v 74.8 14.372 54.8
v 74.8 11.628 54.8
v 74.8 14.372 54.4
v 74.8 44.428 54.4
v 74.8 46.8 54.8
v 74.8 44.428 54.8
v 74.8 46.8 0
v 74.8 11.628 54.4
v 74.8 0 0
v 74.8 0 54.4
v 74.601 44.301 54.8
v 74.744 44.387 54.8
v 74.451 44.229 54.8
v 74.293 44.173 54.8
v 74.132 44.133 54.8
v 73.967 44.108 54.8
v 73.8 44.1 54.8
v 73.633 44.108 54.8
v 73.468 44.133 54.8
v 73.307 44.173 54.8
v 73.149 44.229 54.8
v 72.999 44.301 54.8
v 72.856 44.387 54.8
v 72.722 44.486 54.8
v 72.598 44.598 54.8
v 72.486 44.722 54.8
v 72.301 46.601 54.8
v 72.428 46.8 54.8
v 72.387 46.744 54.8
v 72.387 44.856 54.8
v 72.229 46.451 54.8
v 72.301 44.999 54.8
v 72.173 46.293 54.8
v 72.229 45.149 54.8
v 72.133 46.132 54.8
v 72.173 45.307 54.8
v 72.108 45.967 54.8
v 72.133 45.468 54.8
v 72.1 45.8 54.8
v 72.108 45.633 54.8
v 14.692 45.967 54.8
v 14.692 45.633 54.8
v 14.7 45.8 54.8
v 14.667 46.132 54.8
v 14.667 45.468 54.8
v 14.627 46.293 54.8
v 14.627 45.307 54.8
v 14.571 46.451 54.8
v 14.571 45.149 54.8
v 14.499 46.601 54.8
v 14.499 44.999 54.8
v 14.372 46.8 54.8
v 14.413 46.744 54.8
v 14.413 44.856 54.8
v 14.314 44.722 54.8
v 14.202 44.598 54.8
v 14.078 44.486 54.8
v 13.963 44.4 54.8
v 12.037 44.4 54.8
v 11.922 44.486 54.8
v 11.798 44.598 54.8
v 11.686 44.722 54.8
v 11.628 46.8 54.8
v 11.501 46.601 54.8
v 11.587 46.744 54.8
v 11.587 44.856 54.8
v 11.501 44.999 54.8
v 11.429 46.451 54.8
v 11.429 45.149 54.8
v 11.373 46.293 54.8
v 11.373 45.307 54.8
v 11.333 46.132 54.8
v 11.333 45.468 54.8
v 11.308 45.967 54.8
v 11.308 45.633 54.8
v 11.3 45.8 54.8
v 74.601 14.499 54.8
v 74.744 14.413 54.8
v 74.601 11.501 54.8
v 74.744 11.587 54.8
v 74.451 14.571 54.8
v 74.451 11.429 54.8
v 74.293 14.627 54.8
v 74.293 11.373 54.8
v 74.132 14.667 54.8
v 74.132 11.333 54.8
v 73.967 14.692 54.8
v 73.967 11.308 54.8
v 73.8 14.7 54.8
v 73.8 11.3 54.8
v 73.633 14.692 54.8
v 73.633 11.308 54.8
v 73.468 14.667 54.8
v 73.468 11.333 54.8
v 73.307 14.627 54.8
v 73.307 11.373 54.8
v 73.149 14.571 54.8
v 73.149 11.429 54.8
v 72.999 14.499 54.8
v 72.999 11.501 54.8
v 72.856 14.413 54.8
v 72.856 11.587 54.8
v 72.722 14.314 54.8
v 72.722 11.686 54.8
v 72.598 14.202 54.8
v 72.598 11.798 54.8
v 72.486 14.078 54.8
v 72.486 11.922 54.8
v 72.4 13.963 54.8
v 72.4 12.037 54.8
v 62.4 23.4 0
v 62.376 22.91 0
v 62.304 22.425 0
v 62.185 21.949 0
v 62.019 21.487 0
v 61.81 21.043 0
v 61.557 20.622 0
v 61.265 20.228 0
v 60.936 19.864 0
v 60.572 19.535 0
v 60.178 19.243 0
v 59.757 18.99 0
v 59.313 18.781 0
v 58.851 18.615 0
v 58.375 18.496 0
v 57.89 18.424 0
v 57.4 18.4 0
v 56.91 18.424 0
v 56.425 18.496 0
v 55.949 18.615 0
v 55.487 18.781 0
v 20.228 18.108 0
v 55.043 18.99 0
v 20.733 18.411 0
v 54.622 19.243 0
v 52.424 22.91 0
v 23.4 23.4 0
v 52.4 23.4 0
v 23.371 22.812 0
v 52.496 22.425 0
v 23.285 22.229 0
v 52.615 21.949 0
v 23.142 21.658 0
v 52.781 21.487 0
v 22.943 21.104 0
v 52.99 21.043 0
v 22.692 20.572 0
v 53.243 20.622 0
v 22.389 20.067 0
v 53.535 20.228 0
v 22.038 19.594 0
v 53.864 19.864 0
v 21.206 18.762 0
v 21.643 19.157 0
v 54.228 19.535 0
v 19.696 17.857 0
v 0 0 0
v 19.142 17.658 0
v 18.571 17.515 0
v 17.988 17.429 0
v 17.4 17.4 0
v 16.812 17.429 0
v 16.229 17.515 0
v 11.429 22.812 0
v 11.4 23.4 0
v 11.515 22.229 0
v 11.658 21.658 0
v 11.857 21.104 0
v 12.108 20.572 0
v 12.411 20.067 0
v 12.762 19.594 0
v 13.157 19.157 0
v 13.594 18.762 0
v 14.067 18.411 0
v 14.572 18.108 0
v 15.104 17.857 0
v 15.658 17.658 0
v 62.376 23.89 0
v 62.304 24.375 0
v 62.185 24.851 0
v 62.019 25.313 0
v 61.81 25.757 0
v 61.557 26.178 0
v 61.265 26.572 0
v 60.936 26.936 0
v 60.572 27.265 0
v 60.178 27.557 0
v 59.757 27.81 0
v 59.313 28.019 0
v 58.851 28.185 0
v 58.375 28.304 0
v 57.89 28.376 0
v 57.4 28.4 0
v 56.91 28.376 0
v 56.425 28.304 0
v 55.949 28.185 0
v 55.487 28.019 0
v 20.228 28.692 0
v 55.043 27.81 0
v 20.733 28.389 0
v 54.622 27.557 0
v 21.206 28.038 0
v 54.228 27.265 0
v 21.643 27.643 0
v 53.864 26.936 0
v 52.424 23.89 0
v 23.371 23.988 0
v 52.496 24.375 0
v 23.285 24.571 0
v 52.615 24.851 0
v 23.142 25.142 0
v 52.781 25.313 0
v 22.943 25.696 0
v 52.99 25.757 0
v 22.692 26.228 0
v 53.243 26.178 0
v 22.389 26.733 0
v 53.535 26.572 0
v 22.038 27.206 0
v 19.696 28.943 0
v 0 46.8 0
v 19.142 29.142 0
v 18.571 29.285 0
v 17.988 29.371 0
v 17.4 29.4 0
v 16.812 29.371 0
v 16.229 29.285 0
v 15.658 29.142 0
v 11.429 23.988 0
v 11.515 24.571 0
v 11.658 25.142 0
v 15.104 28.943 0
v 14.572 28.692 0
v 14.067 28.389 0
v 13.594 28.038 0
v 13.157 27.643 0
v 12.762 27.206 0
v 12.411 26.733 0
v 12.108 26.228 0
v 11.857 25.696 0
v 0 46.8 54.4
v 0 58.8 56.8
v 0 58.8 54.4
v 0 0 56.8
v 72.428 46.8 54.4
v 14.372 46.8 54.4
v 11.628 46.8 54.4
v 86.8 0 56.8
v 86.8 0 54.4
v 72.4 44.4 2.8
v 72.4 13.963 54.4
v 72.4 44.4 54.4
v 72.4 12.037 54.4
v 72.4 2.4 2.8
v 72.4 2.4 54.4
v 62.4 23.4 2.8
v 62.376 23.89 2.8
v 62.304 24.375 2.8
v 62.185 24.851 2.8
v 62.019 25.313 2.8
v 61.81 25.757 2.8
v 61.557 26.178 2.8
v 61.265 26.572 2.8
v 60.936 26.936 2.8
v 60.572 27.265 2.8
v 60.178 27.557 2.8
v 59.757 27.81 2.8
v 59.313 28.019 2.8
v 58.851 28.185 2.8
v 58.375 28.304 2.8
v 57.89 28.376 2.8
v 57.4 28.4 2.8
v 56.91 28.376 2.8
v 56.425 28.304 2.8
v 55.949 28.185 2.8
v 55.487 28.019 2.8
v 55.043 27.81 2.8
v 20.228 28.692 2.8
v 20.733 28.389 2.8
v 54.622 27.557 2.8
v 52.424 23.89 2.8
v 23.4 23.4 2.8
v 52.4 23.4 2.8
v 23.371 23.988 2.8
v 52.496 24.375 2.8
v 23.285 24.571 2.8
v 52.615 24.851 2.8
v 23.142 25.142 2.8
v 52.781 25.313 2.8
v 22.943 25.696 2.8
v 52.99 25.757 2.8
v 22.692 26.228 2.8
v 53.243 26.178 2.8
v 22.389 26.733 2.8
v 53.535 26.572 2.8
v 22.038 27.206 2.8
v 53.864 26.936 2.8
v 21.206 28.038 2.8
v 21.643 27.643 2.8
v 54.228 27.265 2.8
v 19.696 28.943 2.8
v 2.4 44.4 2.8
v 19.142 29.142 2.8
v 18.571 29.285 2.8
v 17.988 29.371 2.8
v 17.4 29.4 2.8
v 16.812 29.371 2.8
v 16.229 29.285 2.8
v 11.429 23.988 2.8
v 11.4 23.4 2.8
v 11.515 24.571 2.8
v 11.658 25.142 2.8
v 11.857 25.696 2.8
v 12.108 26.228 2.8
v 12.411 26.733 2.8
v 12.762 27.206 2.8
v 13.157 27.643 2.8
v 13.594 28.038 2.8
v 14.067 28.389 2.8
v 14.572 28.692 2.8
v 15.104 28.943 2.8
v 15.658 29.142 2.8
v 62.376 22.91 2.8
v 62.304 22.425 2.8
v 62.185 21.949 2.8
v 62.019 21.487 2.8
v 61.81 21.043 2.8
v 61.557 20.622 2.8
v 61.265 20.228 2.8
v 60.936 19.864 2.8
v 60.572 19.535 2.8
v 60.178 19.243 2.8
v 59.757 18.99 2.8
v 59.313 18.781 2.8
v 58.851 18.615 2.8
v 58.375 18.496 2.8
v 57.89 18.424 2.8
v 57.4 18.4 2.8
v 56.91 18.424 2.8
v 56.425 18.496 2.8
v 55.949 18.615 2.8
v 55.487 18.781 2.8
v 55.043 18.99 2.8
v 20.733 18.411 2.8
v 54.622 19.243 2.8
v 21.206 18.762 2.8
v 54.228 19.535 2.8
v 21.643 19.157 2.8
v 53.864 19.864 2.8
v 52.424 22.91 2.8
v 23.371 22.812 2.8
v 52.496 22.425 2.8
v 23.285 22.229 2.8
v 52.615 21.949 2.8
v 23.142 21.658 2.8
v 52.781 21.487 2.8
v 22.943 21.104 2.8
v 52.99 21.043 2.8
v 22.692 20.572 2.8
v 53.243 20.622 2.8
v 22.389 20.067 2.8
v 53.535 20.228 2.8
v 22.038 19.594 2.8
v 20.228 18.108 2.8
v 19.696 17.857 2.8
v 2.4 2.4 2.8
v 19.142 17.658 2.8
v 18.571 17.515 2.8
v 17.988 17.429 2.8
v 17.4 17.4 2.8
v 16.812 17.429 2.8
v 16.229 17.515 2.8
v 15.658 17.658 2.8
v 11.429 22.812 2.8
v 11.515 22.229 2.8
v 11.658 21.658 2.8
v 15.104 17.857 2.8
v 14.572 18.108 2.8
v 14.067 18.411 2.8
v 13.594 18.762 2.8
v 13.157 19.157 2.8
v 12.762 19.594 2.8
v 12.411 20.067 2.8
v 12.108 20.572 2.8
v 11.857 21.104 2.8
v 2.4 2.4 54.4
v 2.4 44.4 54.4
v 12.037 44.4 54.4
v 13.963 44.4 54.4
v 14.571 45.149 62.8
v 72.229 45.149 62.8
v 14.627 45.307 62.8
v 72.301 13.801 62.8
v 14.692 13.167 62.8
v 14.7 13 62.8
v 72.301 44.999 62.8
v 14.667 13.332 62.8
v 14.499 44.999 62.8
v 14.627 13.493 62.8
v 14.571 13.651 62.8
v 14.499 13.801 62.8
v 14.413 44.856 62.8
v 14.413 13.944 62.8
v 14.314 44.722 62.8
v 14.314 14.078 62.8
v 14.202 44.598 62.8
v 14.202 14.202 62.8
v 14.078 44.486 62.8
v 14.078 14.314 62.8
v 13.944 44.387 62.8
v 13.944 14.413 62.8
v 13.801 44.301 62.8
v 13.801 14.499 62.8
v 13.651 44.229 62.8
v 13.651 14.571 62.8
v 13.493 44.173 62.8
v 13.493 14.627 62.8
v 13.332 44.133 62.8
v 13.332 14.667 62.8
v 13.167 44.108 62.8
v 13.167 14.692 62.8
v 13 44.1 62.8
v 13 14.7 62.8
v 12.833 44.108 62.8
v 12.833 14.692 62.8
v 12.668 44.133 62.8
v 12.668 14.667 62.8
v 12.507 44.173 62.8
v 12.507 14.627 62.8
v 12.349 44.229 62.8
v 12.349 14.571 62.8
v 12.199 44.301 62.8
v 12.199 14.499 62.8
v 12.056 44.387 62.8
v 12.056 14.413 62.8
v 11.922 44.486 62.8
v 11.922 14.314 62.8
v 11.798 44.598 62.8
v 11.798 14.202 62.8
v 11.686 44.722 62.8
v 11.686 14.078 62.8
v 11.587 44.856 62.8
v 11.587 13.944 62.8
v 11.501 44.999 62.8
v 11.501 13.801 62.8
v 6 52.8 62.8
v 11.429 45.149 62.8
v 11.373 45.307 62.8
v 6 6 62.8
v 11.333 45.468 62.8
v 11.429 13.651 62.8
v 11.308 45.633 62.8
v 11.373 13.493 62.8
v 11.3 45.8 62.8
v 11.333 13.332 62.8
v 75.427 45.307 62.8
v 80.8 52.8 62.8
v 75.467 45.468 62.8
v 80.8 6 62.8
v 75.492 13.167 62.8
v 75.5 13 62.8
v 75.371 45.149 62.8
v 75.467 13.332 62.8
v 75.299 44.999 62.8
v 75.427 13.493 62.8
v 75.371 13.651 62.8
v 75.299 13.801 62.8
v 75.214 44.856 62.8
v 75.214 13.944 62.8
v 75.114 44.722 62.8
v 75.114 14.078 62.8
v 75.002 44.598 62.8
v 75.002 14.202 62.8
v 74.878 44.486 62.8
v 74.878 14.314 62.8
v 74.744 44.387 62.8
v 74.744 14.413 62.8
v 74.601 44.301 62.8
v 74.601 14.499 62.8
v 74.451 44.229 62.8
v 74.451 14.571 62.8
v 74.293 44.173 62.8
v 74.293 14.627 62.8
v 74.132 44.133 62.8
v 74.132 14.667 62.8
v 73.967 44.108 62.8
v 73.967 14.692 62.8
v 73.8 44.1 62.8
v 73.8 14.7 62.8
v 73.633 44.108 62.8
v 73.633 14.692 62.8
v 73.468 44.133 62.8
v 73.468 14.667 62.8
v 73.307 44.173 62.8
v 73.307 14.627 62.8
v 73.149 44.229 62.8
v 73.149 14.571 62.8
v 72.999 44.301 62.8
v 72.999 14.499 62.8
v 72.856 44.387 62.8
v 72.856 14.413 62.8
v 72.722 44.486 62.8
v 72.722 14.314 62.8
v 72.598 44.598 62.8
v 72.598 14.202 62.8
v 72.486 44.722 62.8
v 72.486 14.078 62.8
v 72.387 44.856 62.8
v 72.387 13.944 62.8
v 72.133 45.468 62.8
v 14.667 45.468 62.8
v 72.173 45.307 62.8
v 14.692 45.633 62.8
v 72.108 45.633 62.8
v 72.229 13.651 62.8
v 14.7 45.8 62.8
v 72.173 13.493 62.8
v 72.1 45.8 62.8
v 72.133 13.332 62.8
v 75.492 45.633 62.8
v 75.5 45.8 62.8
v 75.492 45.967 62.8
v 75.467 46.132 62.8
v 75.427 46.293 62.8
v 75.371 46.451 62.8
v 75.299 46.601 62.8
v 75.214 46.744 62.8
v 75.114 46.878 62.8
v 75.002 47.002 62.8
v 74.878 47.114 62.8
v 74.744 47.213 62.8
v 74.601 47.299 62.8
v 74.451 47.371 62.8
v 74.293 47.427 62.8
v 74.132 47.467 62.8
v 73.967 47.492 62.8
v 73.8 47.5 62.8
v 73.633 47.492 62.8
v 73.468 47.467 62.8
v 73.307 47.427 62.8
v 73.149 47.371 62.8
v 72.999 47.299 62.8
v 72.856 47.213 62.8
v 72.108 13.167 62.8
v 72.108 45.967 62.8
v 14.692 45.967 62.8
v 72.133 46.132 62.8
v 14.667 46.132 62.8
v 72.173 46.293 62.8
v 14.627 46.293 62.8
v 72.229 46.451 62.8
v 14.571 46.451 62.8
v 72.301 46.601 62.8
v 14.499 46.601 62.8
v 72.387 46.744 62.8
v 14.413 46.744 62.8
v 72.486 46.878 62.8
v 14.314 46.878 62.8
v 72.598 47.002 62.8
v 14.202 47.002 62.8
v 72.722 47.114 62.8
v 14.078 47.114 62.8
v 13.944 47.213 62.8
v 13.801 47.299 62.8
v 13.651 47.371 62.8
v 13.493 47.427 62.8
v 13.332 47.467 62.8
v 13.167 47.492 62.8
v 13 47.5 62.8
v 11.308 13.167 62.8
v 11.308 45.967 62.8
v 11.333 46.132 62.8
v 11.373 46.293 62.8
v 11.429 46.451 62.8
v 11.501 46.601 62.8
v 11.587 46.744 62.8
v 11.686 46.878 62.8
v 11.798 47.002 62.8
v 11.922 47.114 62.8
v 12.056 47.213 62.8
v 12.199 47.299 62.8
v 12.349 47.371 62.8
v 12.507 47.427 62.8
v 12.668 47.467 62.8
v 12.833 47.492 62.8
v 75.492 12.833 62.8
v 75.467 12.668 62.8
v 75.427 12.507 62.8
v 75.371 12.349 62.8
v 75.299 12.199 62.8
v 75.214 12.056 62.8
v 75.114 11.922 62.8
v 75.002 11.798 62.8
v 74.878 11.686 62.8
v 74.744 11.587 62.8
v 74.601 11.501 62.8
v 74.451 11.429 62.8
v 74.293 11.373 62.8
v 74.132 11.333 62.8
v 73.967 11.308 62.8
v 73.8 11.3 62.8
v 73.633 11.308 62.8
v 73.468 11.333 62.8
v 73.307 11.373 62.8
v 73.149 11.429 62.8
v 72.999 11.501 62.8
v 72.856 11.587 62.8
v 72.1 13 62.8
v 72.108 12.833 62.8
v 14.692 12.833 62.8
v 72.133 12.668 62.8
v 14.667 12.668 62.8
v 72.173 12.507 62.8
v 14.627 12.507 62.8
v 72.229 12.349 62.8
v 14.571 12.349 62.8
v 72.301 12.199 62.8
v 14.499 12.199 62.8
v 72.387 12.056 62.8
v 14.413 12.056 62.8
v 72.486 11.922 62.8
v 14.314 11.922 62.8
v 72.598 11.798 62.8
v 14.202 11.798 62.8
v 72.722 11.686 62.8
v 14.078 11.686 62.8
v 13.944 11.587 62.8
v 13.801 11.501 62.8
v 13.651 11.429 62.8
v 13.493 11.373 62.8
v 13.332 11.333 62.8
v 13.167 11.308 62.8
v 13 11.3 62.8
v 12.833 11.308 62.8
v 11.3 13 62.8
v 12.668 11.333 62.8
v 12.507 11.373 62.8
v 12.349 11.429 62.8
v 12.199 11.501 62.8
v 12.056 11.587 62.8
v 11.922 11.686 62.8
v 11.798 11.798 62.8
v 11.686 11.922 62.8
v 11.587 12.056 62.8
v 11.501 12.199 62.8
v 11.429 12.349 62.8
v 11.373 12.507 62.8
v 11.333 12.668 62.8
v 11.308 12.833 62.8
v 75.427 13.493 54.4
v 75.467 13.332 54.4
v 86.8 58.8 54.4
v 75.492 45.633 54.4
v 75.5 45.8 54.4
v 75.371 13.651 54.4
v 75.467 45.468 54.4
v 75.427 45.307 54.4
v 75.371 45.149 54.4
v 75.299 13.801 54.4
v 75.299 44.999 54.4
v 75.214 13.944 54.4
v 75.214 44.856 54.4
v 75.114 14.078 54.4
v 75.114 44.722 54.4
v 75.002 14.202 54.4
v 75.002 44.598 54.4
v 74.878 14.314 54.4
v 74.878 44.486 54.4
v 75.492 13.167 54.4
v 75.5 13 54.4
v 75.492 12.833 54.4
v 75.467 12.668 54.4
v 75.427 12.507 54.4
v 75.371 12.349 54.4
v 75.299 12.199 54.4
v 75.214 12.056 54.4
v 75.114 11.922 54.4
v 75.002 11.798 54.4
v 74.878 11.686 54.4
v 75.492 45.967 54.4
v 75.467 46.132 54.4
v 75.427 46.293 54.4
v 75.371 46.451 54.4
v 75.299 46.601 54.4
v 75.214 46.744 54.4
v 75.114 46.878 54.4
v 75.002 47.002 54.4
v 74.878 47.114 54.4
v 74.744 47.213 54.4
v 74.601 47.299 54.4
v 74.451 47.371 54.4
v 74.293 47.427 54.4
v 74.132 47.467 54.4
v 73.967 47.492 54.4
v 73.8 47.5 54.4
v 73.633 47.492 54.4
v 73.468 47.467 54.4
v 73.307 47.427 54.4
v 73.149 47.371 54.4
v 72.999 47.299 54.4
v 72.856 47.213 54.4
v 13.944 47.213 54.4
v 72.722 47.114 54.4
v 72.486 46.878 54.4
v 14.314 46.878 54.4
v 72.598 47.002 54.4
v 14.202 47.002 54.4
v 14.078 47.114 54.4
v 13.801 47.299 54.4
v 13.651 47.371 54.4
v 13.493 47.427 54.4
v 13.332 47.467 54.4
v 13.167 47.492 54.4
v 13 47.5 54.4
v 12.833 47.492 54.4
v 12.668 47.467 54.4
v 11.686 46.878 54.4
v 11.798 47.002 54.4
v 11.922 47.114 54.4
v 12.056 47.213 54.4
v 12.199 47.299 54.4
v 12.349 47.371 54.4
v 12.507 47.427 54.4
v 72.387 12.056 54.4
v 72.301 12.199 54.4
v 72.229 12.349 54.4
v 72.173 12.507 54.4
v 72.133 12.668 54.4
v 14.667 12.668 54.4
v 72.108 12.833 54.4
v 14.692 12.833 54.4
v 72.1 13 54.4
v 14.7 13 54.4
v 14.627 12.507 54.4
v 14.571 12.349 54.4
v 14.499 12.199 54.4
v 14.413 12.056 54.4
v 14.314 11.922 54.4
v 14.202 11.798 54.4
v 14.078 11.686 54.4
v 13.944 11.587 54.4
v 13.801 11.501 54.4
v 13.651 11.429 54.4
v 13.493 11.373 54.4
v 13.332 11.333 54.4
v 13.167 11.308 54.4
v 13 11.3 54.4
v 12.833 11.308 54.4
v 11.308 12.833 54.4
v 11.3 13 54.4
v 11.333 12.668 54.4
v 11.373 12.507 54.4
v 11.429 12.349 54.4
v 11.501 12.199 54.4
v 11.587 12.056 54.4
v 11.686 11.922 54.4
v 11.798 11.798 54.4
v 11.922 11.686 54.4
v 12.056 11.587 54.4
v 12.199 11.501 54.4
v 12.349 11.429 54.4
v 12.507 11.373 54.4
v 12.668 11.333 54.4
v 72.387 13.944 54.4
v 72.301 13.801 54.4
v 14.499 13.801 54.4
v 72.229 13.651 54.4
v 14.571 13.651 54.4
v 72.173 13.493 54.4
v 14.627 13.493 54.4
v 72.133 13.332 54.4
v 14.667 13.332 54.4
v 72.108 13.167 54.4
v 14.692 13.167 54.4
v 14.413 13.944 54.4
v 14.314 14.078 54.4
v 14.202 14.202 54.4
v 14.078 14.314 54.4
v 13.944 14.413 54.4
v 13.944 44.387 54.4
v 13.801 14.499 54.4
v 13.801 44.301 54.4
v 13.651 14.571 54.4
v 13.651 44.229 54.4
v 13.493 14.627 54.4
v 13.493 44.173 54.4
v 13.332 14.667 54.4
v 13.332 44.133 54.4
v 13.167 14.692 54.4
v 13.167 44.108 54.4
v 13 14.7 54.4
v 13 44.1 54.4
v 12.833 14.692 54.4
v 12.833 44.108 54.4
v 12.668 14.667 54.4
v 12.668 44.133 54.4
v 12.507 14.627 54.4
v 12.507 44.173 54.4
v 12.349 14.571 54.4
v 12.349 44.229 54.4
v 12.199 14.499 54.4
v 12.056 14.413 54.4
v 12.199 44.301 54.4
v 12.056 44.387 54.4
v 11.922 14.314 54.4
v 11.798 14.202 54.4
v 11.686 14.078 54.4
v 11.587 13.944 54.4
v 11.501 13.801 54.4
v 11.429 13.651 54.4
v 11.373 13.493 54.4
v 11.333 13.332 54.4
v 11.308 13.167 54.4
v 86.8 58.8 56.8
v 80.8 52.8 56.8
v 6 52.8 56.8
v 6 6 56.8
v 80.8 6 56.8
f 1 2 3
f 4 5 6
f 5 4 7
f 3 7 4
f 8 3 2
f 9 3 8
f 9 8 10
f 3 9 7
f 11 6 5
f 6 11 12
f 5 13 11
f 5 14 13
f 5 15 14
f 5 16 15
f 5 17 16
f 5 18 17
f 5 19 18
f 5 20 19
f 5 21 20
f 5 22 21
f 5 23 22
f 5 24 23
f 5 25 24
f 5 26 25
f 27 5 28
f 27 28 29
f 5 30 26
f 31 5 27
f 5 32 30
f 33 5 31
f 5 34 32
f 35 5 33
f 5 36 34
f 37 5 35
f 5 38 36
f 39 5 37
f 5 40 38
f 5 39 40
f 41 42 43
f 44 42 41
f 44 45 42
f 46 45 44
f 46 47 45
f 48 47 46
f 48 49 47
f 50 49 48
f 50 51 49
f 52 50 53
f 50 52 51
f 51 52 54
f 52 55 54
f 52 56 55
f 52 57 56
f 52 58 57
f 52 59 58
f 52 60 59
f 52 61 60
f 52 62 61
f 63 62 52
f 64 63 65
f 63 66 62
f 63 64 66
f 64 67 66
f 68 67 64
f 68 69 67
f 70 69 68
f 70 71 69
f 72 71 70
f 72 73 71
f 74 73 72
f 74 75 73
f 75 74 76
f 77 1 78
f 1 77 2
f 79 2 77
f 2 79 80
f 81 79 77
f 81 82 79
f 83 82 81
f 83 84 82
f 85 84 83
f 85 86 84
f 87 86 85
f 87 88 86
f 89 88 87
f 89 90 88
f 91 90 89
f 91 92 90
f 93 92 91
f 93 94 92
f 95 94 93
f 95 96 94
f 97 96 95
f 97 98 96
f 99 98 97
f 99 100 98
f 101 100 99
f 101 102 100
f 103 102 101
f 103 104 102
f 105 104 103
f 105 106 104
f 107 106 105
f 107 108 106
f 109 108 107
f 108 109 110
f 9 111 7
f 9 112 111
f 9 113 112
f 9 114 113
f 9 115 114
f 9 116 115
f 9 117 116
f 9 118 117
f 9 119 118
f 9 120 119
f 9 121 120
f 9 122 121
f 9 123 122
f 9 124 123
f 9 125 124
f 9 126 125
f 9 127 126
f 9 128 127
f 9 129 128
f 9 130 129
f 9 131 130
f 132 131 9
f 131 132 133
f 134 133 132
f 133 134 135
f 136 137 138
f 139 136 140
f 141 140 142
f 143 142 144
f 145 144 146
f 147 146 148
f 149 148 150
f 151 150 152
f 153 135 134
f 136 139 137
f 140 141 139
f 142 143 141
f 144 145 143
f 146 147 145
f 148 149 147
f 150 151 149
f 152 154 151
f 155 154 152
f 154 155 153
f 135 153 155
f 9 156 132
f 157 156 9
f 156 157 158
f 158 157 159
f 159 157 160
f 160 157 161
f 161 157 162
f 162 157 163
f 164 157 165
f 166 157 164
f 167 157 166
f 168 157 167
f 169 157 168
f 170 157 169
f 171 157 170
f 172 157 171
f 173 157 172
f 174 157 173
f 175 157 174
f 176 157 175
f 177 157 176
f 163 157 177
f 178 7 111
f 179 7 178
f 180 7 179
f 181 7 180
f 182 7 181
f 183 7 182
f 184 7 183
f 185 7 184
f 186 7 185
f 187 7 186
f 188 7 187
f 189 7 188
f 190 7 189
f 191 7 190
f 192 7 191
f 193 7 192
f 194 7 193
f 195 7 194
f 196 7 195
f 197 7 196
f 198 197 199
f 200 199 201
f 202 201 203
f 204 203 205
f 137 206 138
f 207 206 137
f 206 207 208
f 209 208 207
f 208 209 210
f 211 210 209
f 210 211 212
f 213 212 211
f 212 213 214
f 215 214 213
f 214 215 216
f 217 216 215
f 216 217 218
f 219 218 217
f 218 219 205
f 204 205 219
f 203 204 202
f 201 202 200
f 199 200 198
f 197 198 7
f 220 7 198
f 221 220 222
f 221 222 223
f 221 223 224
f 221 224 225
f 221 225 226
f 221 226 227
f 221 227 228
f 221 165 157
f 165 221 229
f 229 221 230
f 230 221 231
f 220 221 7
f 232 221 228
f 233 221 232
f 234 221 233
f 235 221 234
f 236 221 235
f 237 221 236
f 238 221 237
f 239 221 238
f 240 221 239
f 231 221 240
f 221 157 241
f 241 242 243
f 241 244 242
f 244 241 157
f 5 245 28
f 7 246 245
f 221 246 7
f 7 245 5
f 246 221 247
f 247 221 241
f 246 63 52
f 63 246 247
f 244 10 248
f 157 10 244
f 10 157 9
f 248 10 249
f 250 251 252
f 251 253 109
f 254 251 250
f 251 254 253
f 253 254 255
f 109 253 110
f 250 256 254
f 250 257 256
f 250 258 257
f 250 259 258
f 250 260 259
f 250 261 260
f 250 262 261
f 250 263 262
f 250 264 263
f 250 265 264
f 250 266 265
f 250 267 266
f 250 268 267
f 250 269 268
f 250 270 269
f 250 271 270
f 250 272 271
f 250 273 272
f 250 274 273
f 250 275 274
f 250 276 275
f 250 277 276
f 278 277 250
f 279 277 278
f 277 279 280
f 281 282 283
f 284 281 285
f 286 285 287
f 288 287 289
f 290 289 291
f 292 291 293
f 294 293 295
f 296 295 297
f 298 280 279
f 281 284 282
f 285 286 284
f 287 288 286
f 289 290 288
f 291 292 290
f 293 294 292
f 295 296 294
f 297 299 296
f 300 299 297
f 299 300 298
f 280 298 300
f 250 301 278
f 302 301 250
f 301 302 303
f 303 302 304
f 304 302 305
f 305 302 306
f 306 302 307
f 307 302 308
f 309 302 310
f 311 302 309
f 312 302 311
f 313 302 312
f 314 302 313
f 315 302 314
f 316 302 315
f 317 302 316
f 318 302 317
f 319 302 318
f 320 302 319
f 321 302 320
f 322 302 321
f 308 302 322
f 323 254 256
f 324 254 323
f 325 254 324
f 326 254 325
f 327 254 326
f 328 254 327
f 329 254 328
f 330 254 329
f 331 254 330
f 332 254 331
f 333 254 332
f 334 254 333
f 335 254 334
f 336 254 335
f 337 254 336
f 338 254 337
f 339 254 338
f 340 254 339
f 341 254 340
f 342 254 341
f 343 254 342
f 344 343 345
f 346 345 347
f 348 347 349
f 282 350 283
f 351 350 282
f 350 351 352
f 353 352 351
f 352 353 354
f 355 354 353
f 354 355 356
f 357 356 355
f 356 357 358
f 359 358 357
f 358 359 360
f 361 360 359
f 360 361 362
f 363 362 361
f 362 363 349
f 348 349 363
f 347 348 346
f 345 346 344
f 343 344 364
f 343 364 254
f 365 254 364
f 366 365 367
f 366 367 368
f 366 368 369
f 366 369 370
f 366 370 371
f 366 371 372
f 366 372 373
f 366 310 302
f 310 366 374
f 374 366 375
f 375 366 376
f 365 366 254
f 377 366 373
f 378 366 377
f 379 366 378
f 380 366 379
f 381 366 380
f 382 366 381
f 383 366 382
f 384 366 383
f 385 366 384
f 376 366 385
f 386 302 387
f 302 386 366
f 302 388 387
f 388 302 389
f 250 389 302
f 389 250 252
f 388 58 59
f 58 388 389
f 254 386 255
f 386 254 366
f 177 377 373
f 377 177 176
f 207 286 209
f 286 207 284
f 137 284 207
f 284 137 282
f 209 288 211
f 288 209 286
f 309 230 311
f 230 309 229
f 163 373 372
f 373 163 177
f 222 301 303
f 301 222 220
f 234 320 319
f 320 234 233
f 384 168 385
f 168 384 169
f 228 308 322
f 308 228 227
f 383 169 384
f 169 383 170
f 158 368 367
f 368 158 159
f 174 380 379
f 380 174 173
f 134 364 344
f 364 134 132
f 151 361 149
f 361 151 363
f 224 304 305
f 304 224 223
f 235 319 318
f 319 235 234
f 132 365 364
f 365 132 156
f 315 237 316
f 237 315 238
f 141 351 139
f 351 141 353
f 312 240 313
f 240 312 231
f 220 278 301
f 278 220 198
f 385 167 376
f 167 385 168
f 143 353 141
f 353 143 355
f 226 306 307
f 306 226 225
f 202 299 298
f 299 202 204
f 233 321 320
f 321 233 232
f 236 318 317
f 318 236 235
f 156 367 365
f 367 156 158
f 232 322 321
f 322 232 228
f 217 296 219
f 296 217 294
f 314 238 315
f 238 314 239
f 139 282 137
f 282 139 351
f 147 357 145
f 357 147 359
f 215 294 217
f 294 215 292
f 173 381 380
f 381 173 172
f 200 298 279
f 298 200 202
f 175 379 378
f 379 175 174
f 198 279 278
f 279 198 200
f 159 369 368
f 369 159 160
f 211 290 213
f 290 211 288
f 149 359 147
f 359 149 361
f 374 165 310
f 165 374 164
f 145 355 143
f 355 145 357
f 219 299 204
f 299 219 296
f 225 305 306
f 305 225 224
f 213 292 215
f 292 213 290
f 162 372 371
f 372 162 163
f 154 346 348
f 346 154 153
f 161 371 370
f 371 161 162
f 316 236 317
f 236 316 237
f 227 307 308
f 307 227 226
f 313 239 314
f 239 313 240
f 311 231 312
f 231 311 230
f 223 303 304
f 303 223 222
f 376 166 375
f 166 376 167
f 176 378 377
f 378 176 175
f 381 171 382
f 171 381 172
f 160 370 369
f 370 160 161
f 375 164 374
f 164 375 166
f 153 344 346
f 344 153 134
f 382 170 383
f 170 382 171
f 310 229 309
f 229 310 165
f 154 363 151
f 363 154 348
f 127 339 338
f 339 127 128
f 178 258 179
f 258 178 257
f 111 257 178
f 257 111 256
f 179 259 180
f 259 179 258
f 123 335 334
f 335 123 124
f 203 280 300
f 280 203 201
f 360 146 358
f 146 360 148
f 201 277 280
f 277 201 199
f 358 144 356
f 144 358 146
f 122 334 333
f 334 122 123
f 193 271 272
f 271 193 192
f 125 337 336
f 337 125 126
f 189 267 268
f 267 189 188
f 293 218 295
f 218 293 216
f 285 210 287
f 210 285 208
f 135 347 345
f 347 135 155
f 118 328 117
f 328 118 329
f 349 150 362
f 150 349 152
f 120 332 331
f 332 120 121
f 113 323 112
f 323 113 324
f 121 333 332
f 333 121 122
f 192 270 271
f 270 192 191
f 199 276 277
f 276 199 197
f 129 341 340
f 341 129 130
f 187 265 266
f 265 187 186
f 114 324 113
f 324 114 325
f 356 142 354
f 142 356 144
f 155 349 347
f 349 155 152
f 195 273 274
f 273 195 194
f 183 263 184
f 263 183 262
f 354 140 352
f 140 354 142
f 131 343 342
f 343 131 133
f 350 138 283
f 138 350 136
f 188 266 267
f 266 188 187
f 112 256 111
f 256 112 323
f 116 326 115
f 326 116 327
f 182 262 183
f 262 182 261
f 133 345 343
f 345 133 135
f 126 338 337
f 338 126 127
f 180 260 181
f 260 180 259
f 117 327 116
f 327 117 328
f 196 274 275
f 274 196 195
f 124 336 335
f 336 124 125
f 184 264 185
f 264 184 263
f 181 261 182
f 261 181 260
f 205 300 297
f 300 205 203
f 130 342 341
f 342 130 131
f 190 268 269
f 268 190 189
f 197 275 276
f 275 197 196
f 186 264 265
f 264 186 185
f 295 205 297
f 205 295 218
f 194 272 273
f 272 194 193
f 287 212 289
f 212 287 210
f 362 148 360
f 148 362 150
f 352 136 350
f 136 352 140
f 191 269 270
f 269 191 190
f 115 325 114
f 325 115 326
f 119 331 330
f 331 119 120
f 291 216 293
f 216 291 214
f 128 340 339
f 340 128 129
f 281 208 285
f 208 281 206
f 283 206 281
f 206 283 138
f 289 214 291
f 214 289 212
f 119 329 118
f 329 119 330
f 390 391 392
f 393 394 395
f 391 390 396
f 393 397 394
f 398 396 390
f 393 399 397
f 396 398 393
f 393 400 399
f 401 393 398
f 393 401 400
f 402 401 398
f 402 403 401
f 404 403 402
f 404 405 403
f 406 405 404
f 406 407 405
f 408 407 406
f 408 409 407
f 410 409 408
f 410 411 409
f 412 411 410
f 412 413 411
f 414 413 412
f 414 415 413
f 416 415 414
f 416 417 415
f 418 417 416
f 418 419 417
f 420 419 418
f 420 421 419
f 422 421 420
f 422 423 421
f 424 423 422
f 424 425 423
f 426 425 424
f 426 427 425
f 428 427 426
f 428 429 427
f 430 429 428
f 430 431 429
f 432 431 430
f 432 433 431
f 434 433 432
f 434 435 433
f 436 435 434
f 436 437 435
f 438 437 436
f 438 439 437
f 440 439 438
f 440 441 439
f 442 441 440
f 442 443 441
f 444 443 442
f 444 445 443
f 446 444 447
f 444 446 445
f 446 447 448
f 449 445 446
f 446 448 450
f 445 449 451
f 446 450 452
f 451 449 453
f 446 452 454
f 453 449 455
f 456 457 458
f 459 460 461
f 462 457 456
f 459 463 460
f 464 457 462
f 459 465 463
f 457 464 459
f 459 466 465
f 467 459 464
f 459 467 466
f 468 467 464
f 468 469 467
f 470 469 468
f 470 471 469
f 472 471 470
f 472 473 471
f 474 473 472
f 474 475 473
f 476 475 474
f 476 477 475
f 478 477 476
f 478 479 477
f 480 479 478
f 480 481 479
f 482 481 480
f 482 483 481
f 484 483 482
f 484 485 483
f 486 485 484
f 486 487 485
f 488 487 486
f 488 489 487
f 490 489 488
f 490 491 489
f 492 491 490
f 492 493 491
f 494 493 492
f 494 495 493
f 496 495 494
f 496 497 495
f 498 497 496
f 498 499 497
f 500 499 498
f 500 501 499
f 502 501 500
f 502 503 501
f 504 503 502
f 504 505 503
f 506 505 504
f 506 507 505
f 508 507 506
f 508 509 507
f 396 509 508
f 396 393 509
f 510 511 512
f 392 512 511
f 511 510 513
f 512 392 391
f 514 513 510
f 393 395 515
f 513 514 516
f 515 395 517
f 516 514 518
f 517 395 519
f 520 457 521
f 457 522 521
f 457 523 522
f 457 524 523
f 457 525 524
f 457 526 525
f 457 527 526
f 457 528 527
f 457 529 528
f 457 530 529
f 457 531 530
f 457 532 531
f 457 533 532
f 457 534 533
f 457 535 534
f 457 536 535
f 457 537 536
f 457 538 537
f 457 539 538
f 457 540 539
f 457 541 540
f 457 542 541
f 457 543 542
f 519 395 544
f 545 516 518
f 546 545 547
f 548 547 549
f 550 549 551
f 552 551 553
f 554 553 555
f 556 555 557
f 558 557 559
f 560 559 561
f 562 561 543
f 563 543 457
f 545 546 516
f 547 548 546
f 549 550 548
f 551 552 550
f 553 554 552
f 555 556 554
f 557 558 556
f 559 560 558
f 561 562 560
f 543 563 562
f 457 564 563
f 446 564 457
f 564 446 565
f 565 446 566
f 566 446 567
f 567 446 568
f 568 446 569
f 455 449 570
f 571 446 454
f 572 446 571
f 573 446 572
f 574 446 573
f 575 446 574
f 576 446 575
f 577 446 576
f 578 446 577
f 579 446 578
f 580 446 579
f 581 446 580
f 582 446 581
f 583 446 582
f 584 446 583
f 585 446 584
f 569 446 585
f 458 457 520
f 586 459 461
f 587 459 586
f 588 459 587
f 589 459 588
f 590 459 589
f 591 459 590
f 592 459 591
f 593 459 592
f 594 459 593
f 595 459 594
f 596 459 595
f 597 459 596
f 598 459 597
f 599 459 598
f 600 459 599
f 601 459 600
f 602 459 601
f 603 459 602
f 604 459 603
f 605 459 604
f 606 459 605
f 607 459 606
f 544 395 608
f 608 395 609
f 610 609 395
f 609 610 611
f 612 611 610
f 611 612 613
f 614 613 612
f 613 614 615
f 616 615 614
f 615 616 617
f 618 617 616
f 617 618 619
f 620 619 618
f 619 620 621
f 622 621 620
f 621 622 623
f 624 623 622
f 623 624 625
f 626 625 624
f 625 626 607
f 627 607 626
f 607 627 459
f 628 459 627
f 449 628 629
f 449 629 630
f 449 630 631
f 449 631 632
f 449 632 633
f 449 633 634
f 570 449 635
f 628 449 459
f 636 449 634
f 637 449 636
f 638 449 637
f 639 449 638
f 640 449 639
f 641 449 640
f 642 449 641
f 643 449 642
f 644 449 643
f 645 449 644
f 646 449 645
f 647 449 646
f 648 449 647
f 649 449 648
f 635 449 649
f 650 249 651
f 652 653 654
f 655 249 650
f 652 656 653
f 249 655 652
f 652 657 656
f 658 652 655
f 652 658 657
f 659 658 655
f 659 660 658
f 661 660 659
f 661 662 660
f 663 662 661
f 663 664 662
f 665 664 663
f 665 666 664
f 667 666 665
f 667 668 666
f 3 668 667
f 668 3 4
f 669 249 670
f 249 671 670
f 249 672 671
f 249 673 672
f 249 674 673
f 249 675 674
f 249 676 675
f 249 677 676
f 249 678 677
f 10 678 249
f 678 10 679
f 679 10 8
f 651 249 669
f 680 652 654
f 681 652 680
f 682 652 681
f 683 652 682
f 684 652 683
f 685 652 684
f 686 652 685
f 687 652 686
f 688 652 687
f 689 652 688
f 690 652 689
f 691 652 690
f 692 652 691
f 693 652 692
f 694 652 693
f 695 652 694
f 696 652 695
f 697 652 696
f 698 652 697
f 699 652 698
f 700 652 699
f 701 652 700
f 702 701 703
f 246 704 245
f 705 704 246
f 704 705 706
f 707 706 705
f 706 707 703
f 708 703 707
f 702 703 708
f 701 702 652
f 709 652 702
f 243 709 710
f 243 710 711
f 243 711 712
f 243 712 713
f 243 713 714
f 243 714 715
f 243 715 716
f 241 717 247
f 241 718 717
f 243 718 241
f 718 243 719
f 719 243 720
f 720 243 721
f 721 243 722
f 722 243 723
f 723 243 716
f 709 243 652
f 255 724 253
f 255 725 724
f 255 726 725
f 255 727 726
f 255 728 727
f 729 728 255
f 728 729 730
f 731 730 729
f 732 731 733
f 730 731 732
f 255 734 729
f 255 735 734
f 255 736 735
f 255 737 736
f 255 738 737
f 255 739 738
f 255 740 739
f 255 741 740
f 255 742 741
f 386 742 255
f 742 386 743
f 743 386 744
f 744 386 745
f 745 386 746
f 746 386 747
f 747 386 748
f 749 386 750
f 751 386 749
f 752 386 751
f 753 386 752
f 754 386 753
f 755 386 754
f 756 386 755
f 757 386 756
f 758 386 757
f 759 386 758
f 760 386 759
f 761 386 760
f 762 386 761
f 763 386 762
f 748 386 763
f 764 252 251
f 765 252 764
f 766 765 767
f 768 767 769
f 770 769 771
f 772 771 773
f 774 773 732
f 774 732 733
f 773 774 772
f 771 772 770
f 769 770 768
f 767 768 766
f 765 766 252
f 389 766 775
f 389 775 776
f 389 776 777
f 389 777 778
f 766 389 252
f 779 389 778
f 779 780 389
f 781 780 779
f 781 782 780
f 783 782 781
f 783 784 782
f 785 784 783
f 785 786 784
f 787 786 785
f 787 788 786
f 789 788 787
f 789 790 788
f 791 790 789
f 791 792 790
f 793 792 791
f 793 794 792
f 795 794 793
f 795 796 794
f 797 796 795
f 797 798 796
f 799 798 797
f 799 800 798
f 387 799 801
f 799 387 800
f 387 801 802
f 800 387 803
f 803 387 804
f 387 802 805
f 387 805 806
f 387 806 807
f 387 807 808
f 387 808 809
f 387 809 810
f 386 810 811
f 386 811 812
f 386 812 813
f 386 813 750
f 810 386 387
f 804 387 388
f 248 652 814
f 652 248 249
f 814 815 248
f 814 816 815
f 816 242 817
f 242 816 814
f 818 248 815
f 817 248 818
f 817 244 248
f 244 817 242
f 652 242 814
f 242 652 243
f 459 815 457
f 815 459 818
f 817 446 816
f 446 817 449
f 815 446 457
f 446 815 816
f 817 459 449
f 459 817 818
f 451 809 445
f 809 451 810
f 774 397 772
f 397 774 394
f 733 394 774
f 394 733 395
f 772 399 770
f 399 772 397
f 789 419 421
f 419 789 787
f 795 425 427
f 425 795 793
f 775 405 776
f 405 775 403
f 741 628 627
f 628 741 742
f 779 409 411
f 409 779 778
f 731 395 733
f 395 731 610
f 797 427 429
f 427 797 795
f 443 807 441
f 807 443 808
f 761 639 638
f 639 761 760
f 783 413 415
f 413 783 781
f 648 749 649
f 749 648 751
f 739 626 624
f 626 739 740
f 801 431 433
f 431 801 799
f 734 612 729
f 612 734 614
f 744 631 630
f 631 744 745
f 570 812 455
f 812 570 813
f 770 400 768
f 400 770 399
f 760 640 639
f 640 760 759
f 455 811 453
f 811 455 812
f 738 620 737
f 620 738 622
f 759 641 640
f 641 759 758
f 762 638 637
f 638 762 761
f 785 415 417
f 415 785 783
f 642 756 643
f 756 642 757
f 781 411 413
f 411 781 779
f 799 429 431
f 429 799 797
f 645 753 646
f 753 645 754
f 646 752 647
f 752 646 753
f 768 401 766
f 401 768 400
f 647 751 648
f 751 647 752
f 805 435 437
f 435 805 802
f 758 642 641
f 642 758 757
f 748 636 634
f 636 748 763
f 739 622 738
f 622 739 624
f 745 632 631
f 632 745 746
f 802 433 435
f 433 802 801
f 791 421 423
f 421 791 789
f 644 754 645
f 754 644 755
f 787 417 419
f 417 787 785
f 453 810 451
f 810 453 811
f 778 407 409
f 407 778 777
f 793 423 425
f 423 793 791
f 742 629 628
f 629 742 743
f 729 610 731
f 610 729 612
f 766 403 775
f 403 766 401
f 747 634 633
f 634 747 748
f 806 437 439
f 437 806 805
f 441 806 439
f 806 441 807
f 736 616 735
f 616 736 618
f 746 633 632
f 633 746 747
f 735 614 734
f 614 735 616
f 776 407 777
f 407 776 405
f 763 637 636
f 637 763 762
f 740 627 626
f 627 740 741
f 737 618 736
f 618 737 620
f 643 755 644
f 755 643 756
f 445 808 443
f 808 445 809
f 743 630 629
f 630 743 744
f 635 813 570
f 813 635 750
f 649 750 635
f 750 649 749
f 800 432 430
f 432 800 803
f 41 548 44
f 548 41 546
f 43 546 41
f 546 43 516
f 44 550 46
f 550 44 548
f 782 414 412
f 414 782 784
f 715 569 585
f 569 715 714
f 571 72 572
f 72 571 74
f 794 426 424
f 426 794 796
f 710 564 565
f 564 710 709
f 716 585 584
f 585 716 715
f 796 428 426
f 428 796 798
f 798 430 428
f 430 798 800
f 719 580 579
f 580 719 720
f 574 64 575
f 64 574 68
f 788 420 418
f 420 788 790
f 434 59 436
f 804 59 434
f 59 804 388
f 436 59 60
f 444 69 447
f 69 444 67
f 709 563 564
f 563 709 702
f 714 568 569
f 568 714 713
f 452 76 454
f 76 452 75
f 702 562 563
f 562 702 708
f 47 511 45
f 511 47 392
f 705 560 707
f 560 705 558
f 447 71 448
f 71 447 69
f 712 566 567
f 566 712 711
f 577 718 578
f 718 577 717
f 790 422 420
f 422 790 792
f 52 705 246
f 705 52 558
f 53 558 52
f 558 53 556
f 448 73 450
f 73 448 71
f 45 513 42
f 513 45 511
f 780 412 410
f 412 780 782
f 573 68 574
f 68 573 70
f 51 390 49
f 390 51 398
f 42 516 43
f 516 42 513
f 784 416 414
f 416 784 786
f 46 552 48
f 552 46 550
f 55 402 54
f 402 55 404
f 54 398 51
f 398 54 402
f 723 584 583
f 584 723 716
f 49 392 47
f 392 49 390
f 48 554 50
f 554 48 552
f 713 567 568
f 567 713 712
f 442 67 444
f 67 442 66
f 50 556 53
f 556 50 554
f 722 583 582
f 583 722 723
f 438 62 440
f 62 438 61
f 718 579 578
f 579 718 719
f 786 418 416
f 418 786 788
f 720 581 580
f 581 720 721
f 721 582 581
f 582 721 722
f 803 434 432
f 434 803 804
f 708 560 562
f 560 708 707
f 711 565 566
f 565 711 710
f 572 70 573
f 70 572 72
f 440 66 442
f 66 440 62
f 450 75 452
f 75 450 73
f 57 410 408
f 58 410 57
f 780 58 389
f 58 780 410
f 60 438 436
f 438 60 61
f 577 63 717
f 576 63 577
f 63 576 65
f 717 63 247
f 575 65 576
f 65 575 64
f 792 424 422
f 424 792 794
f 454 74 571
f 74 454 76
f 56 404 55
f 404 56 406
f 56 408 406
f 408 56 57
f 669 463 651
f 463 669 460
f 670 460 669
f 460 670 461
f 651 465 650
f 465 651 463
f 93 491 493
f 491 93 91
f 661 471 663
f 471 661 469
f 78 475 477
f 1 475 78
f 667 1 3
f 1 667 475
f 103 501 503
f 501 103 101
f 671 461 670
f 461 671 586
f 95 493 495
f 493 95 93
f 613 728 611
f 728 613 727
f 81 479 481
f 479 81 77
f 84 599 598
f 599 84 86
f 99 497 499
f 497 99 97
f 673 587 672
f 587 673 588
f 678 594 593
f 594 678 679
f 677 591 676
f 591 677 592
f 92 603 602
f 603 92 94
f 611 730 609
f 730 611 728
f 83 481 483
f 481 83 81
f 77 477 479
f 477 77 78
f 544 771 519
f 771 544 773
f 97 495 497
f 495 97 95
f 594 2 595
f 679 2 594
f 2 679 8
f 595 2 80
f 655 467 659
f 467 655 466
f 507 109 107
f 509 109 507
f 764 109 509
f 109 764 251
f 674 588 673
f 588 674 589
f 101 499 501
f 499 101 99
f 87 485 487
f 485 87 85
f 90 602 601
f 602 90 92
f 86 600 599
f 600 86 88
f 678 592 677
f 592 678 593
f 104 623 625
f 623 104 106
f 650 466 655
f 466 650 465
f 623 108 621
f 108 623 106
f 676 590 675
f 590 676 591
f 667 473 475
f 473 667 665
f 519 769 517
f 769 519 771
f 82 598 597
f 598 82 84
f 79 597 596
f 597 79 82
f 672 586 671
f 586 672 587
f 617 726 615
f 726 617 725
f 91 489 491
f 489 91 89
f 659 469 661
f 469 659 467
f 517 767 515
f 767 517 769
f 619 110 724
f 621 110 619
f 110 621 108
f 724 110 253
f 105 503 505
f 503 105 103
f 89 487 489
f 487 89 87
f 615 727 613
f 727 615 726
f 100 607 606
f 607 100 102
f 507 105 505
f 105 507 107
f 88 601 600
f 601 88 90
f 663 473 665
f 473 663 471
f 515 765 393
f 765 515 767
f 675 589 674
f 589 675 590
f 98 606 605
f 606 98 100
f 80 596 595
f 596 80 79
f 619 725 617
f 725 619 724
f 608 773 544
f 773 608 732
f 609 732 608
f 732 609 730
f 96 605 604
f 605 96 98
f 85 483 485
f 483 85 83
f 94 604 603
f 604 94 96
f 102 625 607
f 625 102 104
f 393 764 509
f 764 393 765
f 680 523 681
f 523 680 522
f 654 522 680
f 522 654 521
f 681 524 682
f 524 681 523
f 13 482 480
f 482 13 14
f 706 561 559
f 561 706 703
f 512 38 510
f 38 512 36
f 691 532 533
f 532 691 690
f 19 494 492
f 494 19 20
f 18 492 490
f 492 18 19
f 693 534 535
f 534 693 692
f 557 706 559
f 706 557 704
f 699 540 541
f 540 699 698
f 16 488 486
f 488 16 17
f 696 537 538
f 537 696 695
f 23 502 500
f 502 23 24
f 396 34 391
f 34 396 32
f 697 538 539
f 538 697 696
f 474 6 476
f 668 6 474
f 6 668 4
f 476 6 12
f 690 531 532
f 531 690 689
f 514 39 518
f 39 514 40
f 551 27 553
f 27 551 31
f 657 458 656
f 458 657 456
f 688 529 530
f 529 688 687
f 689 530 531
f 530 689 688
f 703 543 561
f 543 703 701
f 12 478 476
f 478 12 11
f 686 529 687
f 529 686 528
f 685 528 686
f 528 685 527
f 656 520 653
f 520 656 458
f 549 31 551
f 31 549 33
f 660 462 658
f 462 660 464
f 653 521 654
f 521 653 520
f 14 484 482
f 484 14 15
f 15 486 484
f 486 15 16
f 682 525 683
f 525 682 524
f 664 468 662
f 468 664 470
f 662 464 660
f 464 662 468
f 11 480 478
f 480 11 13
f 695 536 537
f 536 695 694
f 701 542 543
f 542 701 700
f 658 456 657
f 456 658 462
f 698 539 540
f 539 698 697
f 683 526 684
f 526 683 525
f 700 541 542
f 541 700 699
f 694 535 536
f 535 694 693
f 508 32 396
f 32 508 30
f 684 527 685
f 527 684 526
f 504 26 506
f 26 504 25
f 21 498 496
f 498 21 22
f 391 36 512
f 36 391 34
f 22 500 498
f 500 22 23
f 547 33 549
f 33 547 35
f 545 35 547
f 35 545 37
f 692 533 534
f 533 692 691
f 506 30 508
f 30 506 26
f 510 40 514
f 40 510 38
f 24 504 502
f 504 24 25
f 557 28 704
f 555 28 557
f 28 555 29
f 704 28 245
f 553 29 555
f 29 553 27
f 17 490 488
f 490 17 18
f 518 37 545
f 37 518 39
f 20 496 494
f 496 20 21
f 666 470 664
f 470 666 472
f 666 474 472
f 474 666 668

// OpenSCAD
// ============================================================================
// Sprout — Indoor prototype housing (LMAO smart-irrigation node)
// ----------------------------------------------------------------------------
// OpenSCAD parametric box. Edit the values in the PARAMETERS block to match
// YOUR calliper measurements, re-render, slice, print, measure the delta,
// update the param. That is the whole iteration loop for a prototype.
//
// Contains (published M5Stack dims; measure & adjust in PARAMS):
//   - ATOM Lite             24.0 x 24.0 x  9.5 mm
//   - ATOM DTU LoRaWAN base 65.3 x 28.7 x 24.0 mm   (A152-EU868, DIN-rail back)
//     (stacked via 9-pin socket => combined footprint ~65 x 29, ~34 tall)
//   - ENV III on base Port A (SHT30 + QMP6988)      (verify actual size)
//   - Watering Unit U101    192.8 x 26.5 x 33.0 mm  (driver end INSIDE, probe/hose
//     exit through the floor gland -> into soil)
//   - LoRa antenna          RP-SMA duck, 195 mm, exits the side/top
//
// Design choices for an INDOOR bench prototype (see README):
//   - generous clearance + cable room; trim down after you fit it
//   - one-handed service: lid with 4x M3, not glue
//   - USB access slot on the side for mpremote/flash without opening the lid
//   - probe/hose gland + antenna exit on the BOTTOM so water never runs into
//     the electronics (habit for the future outdoor field unit)
// ============================================================================

// ---------------------------------------------------------------------------
// PARAMETERS — tune these
// ---------------------------------------------------------------------------
/* [Fit — measure the real stack and adjust] */
stack_len    = 70;    // X inner length to clear the stack (base is 65.3 -> allow cable tuck)
stack_wid    = 42;    // Y inner width                           (base is 28.7 -> ENV III + cables)
stack_h      = 52;    // Z inner height  (base 24 + Atom 9.5 + headroom + cable bend)

/* [Enclosure structure] */
wall         = 2.4;   // outer wall thickness (2-3 perimeters of 0.4 nozzle)
floor        = 2.8;   // floor thickness (bit thicker so glands thread well)
clearance    = 0.5;   // general fit clearance inside the cavity
lid_thick    = 2.4;
lid_overlap  = 6.0;   // lid skirt that drops over the box walls

/* [Fasteners — 4x M3] */
m3_d         = 3.4;   // tap hole for M3 brass insert (drill driver: ~3.2-3.4)
boss_h       = 6.0;   // screw boss height in the lid
boss_d       = 7.0;   // screw boss outer diameter
screw_inset  = 7.0;   // screw position inset from each box corner

/* [Penetrations] */
usb_w        = 14.0;  // USB-C access slot width  (Atom USB Type-C is at one end)
usb_h        = 8.0;   // slot height (so a cable can plug while lid is on)
usb_offset_z = 8.0;   // slot center height above the floor
usb_on_len   = true;  // slot on the LENGTH (X) side; false = on the WIDTH (Y) side

gland_d      = 12.0;  // probe/hose cable gland bore (bottom) — size to your hose/gland
gland_xoff   = 20.0;  // gland position along X from center
antenna_d    = 10.0;  // antenna bullet/pass-through bore (bottom corner)

/* [Print] */
fn           = 64;    // circle resolution (leave high for clean holes)
debug_split  = false; // true = render box & lid side-by-side for BOM/screenshot

// ---------------------------------------------------------------------------
// Derived
// ---------------------------------------------------------------------------
outer_len = stack_len + 2 * wall;
outer_wid = stack_wid + 2 * wall;
outer_h   = stack_h  + floor;

// ---------------------------------------------------------------------------
// Box body
// ---------------------------------------------------------------------------
module box_body() {
    difference() {
        // solid outer shell (open top)
        difference() {
            cube([outer_len, outer_wid, outer_h], center = false);
            // inner cavity pocket
            translate([wall, wall, floor])
                cube([stack_len, stack_wid, outer_h], center = false);
        }
        // USB service slot (on a side)
        translate([usb_on_len ? (outer_len - wall - usb_w / 2)
                              : (outer_len / 2),
                   usb_on_len ? (outer_wid / 2)
                              : (outer_wid - wall - usb_h / 2),
                   usb_offset_z])
            cube([usb_on_len ? usb_w : usb_h,
                  usb_on_len ? usb_h : usb_w,
                  2 * wall + 1], center = true);
        // bottom gland for the probe/hose + the antenna pass-through
        translate([outer_len / 2 - gland_xoff, outer_wid / 2, -0.01])
            cylinder(d = gland_d,  h = floor + 1, $fn = fn);
        translate([outer_len / 2 + gland_xoff, outer_wid / 2, -0.01])
            cylinder(d = antenna_d, h = floor + 1, $fn = fn);
        // M2 mount point for the Atom (back has an M2 hole) — optional floor boss
        // translate([outer_len/2, outer_wid/2, -0.01])
        //     cylinder(d = 2.5, h = floor + 1, $fn = fn);
    }
}

// ---------------------------------------------------------------------------
// Lid (drops over the box top; 4x M3 screw bosses)
// ---------------------------------------------------------------------------
module lid() {
    difference() {
        union() {
            // main lid plate + drop-down skirt
            cube([outer_len + 2 * lid_overlap, outer_wid + 2 * lid_overlap,
                  lid_thick]);
            translate([lid_overlap, lid_overlap, 0])
                cube([outer_len, outer_wid, lid_thick + lid_overlap]);
            // screw bosses
            for (sx = [screw_inset, outer_len - screw_inset])
                for (sy = [screw_inset, outer_wid - screw_inset])
                    translate([sx + lid_overlap, sy + lid_overlap, 0])
                        cylinder(d = boss_d, h = lid_thick + boss_h, $fn = fn);
        }
        // M3 holes through the bosses
        for (sx = [screw_inset, outer_len - screw_inset])
            for (sy = [screw_inset, outer_wid - screw_inset])
                translate([sx + lid_overlap, sy + lid_overlap, -0.01])
                    cylinder(d = m3_d, h = lid_thick + boss_h + 1, $fn = fn);
    }
}

// ---------------------------------------------------------------------------
// Render
// ---------------------------------------------------------------------------
if (debug_split) {
    translate([0, 0, 0]) box_body();
    translate([outer_len + 2 * lid_overlap + 10, 0, 0]) lid();
} else {
    // assembled view (lid on top, see-through by lowering it slightly)
    color("SteelBlue") box_body();
    translate([0, 0, outer_h - 0.4]) color("Orange") lid();
}
